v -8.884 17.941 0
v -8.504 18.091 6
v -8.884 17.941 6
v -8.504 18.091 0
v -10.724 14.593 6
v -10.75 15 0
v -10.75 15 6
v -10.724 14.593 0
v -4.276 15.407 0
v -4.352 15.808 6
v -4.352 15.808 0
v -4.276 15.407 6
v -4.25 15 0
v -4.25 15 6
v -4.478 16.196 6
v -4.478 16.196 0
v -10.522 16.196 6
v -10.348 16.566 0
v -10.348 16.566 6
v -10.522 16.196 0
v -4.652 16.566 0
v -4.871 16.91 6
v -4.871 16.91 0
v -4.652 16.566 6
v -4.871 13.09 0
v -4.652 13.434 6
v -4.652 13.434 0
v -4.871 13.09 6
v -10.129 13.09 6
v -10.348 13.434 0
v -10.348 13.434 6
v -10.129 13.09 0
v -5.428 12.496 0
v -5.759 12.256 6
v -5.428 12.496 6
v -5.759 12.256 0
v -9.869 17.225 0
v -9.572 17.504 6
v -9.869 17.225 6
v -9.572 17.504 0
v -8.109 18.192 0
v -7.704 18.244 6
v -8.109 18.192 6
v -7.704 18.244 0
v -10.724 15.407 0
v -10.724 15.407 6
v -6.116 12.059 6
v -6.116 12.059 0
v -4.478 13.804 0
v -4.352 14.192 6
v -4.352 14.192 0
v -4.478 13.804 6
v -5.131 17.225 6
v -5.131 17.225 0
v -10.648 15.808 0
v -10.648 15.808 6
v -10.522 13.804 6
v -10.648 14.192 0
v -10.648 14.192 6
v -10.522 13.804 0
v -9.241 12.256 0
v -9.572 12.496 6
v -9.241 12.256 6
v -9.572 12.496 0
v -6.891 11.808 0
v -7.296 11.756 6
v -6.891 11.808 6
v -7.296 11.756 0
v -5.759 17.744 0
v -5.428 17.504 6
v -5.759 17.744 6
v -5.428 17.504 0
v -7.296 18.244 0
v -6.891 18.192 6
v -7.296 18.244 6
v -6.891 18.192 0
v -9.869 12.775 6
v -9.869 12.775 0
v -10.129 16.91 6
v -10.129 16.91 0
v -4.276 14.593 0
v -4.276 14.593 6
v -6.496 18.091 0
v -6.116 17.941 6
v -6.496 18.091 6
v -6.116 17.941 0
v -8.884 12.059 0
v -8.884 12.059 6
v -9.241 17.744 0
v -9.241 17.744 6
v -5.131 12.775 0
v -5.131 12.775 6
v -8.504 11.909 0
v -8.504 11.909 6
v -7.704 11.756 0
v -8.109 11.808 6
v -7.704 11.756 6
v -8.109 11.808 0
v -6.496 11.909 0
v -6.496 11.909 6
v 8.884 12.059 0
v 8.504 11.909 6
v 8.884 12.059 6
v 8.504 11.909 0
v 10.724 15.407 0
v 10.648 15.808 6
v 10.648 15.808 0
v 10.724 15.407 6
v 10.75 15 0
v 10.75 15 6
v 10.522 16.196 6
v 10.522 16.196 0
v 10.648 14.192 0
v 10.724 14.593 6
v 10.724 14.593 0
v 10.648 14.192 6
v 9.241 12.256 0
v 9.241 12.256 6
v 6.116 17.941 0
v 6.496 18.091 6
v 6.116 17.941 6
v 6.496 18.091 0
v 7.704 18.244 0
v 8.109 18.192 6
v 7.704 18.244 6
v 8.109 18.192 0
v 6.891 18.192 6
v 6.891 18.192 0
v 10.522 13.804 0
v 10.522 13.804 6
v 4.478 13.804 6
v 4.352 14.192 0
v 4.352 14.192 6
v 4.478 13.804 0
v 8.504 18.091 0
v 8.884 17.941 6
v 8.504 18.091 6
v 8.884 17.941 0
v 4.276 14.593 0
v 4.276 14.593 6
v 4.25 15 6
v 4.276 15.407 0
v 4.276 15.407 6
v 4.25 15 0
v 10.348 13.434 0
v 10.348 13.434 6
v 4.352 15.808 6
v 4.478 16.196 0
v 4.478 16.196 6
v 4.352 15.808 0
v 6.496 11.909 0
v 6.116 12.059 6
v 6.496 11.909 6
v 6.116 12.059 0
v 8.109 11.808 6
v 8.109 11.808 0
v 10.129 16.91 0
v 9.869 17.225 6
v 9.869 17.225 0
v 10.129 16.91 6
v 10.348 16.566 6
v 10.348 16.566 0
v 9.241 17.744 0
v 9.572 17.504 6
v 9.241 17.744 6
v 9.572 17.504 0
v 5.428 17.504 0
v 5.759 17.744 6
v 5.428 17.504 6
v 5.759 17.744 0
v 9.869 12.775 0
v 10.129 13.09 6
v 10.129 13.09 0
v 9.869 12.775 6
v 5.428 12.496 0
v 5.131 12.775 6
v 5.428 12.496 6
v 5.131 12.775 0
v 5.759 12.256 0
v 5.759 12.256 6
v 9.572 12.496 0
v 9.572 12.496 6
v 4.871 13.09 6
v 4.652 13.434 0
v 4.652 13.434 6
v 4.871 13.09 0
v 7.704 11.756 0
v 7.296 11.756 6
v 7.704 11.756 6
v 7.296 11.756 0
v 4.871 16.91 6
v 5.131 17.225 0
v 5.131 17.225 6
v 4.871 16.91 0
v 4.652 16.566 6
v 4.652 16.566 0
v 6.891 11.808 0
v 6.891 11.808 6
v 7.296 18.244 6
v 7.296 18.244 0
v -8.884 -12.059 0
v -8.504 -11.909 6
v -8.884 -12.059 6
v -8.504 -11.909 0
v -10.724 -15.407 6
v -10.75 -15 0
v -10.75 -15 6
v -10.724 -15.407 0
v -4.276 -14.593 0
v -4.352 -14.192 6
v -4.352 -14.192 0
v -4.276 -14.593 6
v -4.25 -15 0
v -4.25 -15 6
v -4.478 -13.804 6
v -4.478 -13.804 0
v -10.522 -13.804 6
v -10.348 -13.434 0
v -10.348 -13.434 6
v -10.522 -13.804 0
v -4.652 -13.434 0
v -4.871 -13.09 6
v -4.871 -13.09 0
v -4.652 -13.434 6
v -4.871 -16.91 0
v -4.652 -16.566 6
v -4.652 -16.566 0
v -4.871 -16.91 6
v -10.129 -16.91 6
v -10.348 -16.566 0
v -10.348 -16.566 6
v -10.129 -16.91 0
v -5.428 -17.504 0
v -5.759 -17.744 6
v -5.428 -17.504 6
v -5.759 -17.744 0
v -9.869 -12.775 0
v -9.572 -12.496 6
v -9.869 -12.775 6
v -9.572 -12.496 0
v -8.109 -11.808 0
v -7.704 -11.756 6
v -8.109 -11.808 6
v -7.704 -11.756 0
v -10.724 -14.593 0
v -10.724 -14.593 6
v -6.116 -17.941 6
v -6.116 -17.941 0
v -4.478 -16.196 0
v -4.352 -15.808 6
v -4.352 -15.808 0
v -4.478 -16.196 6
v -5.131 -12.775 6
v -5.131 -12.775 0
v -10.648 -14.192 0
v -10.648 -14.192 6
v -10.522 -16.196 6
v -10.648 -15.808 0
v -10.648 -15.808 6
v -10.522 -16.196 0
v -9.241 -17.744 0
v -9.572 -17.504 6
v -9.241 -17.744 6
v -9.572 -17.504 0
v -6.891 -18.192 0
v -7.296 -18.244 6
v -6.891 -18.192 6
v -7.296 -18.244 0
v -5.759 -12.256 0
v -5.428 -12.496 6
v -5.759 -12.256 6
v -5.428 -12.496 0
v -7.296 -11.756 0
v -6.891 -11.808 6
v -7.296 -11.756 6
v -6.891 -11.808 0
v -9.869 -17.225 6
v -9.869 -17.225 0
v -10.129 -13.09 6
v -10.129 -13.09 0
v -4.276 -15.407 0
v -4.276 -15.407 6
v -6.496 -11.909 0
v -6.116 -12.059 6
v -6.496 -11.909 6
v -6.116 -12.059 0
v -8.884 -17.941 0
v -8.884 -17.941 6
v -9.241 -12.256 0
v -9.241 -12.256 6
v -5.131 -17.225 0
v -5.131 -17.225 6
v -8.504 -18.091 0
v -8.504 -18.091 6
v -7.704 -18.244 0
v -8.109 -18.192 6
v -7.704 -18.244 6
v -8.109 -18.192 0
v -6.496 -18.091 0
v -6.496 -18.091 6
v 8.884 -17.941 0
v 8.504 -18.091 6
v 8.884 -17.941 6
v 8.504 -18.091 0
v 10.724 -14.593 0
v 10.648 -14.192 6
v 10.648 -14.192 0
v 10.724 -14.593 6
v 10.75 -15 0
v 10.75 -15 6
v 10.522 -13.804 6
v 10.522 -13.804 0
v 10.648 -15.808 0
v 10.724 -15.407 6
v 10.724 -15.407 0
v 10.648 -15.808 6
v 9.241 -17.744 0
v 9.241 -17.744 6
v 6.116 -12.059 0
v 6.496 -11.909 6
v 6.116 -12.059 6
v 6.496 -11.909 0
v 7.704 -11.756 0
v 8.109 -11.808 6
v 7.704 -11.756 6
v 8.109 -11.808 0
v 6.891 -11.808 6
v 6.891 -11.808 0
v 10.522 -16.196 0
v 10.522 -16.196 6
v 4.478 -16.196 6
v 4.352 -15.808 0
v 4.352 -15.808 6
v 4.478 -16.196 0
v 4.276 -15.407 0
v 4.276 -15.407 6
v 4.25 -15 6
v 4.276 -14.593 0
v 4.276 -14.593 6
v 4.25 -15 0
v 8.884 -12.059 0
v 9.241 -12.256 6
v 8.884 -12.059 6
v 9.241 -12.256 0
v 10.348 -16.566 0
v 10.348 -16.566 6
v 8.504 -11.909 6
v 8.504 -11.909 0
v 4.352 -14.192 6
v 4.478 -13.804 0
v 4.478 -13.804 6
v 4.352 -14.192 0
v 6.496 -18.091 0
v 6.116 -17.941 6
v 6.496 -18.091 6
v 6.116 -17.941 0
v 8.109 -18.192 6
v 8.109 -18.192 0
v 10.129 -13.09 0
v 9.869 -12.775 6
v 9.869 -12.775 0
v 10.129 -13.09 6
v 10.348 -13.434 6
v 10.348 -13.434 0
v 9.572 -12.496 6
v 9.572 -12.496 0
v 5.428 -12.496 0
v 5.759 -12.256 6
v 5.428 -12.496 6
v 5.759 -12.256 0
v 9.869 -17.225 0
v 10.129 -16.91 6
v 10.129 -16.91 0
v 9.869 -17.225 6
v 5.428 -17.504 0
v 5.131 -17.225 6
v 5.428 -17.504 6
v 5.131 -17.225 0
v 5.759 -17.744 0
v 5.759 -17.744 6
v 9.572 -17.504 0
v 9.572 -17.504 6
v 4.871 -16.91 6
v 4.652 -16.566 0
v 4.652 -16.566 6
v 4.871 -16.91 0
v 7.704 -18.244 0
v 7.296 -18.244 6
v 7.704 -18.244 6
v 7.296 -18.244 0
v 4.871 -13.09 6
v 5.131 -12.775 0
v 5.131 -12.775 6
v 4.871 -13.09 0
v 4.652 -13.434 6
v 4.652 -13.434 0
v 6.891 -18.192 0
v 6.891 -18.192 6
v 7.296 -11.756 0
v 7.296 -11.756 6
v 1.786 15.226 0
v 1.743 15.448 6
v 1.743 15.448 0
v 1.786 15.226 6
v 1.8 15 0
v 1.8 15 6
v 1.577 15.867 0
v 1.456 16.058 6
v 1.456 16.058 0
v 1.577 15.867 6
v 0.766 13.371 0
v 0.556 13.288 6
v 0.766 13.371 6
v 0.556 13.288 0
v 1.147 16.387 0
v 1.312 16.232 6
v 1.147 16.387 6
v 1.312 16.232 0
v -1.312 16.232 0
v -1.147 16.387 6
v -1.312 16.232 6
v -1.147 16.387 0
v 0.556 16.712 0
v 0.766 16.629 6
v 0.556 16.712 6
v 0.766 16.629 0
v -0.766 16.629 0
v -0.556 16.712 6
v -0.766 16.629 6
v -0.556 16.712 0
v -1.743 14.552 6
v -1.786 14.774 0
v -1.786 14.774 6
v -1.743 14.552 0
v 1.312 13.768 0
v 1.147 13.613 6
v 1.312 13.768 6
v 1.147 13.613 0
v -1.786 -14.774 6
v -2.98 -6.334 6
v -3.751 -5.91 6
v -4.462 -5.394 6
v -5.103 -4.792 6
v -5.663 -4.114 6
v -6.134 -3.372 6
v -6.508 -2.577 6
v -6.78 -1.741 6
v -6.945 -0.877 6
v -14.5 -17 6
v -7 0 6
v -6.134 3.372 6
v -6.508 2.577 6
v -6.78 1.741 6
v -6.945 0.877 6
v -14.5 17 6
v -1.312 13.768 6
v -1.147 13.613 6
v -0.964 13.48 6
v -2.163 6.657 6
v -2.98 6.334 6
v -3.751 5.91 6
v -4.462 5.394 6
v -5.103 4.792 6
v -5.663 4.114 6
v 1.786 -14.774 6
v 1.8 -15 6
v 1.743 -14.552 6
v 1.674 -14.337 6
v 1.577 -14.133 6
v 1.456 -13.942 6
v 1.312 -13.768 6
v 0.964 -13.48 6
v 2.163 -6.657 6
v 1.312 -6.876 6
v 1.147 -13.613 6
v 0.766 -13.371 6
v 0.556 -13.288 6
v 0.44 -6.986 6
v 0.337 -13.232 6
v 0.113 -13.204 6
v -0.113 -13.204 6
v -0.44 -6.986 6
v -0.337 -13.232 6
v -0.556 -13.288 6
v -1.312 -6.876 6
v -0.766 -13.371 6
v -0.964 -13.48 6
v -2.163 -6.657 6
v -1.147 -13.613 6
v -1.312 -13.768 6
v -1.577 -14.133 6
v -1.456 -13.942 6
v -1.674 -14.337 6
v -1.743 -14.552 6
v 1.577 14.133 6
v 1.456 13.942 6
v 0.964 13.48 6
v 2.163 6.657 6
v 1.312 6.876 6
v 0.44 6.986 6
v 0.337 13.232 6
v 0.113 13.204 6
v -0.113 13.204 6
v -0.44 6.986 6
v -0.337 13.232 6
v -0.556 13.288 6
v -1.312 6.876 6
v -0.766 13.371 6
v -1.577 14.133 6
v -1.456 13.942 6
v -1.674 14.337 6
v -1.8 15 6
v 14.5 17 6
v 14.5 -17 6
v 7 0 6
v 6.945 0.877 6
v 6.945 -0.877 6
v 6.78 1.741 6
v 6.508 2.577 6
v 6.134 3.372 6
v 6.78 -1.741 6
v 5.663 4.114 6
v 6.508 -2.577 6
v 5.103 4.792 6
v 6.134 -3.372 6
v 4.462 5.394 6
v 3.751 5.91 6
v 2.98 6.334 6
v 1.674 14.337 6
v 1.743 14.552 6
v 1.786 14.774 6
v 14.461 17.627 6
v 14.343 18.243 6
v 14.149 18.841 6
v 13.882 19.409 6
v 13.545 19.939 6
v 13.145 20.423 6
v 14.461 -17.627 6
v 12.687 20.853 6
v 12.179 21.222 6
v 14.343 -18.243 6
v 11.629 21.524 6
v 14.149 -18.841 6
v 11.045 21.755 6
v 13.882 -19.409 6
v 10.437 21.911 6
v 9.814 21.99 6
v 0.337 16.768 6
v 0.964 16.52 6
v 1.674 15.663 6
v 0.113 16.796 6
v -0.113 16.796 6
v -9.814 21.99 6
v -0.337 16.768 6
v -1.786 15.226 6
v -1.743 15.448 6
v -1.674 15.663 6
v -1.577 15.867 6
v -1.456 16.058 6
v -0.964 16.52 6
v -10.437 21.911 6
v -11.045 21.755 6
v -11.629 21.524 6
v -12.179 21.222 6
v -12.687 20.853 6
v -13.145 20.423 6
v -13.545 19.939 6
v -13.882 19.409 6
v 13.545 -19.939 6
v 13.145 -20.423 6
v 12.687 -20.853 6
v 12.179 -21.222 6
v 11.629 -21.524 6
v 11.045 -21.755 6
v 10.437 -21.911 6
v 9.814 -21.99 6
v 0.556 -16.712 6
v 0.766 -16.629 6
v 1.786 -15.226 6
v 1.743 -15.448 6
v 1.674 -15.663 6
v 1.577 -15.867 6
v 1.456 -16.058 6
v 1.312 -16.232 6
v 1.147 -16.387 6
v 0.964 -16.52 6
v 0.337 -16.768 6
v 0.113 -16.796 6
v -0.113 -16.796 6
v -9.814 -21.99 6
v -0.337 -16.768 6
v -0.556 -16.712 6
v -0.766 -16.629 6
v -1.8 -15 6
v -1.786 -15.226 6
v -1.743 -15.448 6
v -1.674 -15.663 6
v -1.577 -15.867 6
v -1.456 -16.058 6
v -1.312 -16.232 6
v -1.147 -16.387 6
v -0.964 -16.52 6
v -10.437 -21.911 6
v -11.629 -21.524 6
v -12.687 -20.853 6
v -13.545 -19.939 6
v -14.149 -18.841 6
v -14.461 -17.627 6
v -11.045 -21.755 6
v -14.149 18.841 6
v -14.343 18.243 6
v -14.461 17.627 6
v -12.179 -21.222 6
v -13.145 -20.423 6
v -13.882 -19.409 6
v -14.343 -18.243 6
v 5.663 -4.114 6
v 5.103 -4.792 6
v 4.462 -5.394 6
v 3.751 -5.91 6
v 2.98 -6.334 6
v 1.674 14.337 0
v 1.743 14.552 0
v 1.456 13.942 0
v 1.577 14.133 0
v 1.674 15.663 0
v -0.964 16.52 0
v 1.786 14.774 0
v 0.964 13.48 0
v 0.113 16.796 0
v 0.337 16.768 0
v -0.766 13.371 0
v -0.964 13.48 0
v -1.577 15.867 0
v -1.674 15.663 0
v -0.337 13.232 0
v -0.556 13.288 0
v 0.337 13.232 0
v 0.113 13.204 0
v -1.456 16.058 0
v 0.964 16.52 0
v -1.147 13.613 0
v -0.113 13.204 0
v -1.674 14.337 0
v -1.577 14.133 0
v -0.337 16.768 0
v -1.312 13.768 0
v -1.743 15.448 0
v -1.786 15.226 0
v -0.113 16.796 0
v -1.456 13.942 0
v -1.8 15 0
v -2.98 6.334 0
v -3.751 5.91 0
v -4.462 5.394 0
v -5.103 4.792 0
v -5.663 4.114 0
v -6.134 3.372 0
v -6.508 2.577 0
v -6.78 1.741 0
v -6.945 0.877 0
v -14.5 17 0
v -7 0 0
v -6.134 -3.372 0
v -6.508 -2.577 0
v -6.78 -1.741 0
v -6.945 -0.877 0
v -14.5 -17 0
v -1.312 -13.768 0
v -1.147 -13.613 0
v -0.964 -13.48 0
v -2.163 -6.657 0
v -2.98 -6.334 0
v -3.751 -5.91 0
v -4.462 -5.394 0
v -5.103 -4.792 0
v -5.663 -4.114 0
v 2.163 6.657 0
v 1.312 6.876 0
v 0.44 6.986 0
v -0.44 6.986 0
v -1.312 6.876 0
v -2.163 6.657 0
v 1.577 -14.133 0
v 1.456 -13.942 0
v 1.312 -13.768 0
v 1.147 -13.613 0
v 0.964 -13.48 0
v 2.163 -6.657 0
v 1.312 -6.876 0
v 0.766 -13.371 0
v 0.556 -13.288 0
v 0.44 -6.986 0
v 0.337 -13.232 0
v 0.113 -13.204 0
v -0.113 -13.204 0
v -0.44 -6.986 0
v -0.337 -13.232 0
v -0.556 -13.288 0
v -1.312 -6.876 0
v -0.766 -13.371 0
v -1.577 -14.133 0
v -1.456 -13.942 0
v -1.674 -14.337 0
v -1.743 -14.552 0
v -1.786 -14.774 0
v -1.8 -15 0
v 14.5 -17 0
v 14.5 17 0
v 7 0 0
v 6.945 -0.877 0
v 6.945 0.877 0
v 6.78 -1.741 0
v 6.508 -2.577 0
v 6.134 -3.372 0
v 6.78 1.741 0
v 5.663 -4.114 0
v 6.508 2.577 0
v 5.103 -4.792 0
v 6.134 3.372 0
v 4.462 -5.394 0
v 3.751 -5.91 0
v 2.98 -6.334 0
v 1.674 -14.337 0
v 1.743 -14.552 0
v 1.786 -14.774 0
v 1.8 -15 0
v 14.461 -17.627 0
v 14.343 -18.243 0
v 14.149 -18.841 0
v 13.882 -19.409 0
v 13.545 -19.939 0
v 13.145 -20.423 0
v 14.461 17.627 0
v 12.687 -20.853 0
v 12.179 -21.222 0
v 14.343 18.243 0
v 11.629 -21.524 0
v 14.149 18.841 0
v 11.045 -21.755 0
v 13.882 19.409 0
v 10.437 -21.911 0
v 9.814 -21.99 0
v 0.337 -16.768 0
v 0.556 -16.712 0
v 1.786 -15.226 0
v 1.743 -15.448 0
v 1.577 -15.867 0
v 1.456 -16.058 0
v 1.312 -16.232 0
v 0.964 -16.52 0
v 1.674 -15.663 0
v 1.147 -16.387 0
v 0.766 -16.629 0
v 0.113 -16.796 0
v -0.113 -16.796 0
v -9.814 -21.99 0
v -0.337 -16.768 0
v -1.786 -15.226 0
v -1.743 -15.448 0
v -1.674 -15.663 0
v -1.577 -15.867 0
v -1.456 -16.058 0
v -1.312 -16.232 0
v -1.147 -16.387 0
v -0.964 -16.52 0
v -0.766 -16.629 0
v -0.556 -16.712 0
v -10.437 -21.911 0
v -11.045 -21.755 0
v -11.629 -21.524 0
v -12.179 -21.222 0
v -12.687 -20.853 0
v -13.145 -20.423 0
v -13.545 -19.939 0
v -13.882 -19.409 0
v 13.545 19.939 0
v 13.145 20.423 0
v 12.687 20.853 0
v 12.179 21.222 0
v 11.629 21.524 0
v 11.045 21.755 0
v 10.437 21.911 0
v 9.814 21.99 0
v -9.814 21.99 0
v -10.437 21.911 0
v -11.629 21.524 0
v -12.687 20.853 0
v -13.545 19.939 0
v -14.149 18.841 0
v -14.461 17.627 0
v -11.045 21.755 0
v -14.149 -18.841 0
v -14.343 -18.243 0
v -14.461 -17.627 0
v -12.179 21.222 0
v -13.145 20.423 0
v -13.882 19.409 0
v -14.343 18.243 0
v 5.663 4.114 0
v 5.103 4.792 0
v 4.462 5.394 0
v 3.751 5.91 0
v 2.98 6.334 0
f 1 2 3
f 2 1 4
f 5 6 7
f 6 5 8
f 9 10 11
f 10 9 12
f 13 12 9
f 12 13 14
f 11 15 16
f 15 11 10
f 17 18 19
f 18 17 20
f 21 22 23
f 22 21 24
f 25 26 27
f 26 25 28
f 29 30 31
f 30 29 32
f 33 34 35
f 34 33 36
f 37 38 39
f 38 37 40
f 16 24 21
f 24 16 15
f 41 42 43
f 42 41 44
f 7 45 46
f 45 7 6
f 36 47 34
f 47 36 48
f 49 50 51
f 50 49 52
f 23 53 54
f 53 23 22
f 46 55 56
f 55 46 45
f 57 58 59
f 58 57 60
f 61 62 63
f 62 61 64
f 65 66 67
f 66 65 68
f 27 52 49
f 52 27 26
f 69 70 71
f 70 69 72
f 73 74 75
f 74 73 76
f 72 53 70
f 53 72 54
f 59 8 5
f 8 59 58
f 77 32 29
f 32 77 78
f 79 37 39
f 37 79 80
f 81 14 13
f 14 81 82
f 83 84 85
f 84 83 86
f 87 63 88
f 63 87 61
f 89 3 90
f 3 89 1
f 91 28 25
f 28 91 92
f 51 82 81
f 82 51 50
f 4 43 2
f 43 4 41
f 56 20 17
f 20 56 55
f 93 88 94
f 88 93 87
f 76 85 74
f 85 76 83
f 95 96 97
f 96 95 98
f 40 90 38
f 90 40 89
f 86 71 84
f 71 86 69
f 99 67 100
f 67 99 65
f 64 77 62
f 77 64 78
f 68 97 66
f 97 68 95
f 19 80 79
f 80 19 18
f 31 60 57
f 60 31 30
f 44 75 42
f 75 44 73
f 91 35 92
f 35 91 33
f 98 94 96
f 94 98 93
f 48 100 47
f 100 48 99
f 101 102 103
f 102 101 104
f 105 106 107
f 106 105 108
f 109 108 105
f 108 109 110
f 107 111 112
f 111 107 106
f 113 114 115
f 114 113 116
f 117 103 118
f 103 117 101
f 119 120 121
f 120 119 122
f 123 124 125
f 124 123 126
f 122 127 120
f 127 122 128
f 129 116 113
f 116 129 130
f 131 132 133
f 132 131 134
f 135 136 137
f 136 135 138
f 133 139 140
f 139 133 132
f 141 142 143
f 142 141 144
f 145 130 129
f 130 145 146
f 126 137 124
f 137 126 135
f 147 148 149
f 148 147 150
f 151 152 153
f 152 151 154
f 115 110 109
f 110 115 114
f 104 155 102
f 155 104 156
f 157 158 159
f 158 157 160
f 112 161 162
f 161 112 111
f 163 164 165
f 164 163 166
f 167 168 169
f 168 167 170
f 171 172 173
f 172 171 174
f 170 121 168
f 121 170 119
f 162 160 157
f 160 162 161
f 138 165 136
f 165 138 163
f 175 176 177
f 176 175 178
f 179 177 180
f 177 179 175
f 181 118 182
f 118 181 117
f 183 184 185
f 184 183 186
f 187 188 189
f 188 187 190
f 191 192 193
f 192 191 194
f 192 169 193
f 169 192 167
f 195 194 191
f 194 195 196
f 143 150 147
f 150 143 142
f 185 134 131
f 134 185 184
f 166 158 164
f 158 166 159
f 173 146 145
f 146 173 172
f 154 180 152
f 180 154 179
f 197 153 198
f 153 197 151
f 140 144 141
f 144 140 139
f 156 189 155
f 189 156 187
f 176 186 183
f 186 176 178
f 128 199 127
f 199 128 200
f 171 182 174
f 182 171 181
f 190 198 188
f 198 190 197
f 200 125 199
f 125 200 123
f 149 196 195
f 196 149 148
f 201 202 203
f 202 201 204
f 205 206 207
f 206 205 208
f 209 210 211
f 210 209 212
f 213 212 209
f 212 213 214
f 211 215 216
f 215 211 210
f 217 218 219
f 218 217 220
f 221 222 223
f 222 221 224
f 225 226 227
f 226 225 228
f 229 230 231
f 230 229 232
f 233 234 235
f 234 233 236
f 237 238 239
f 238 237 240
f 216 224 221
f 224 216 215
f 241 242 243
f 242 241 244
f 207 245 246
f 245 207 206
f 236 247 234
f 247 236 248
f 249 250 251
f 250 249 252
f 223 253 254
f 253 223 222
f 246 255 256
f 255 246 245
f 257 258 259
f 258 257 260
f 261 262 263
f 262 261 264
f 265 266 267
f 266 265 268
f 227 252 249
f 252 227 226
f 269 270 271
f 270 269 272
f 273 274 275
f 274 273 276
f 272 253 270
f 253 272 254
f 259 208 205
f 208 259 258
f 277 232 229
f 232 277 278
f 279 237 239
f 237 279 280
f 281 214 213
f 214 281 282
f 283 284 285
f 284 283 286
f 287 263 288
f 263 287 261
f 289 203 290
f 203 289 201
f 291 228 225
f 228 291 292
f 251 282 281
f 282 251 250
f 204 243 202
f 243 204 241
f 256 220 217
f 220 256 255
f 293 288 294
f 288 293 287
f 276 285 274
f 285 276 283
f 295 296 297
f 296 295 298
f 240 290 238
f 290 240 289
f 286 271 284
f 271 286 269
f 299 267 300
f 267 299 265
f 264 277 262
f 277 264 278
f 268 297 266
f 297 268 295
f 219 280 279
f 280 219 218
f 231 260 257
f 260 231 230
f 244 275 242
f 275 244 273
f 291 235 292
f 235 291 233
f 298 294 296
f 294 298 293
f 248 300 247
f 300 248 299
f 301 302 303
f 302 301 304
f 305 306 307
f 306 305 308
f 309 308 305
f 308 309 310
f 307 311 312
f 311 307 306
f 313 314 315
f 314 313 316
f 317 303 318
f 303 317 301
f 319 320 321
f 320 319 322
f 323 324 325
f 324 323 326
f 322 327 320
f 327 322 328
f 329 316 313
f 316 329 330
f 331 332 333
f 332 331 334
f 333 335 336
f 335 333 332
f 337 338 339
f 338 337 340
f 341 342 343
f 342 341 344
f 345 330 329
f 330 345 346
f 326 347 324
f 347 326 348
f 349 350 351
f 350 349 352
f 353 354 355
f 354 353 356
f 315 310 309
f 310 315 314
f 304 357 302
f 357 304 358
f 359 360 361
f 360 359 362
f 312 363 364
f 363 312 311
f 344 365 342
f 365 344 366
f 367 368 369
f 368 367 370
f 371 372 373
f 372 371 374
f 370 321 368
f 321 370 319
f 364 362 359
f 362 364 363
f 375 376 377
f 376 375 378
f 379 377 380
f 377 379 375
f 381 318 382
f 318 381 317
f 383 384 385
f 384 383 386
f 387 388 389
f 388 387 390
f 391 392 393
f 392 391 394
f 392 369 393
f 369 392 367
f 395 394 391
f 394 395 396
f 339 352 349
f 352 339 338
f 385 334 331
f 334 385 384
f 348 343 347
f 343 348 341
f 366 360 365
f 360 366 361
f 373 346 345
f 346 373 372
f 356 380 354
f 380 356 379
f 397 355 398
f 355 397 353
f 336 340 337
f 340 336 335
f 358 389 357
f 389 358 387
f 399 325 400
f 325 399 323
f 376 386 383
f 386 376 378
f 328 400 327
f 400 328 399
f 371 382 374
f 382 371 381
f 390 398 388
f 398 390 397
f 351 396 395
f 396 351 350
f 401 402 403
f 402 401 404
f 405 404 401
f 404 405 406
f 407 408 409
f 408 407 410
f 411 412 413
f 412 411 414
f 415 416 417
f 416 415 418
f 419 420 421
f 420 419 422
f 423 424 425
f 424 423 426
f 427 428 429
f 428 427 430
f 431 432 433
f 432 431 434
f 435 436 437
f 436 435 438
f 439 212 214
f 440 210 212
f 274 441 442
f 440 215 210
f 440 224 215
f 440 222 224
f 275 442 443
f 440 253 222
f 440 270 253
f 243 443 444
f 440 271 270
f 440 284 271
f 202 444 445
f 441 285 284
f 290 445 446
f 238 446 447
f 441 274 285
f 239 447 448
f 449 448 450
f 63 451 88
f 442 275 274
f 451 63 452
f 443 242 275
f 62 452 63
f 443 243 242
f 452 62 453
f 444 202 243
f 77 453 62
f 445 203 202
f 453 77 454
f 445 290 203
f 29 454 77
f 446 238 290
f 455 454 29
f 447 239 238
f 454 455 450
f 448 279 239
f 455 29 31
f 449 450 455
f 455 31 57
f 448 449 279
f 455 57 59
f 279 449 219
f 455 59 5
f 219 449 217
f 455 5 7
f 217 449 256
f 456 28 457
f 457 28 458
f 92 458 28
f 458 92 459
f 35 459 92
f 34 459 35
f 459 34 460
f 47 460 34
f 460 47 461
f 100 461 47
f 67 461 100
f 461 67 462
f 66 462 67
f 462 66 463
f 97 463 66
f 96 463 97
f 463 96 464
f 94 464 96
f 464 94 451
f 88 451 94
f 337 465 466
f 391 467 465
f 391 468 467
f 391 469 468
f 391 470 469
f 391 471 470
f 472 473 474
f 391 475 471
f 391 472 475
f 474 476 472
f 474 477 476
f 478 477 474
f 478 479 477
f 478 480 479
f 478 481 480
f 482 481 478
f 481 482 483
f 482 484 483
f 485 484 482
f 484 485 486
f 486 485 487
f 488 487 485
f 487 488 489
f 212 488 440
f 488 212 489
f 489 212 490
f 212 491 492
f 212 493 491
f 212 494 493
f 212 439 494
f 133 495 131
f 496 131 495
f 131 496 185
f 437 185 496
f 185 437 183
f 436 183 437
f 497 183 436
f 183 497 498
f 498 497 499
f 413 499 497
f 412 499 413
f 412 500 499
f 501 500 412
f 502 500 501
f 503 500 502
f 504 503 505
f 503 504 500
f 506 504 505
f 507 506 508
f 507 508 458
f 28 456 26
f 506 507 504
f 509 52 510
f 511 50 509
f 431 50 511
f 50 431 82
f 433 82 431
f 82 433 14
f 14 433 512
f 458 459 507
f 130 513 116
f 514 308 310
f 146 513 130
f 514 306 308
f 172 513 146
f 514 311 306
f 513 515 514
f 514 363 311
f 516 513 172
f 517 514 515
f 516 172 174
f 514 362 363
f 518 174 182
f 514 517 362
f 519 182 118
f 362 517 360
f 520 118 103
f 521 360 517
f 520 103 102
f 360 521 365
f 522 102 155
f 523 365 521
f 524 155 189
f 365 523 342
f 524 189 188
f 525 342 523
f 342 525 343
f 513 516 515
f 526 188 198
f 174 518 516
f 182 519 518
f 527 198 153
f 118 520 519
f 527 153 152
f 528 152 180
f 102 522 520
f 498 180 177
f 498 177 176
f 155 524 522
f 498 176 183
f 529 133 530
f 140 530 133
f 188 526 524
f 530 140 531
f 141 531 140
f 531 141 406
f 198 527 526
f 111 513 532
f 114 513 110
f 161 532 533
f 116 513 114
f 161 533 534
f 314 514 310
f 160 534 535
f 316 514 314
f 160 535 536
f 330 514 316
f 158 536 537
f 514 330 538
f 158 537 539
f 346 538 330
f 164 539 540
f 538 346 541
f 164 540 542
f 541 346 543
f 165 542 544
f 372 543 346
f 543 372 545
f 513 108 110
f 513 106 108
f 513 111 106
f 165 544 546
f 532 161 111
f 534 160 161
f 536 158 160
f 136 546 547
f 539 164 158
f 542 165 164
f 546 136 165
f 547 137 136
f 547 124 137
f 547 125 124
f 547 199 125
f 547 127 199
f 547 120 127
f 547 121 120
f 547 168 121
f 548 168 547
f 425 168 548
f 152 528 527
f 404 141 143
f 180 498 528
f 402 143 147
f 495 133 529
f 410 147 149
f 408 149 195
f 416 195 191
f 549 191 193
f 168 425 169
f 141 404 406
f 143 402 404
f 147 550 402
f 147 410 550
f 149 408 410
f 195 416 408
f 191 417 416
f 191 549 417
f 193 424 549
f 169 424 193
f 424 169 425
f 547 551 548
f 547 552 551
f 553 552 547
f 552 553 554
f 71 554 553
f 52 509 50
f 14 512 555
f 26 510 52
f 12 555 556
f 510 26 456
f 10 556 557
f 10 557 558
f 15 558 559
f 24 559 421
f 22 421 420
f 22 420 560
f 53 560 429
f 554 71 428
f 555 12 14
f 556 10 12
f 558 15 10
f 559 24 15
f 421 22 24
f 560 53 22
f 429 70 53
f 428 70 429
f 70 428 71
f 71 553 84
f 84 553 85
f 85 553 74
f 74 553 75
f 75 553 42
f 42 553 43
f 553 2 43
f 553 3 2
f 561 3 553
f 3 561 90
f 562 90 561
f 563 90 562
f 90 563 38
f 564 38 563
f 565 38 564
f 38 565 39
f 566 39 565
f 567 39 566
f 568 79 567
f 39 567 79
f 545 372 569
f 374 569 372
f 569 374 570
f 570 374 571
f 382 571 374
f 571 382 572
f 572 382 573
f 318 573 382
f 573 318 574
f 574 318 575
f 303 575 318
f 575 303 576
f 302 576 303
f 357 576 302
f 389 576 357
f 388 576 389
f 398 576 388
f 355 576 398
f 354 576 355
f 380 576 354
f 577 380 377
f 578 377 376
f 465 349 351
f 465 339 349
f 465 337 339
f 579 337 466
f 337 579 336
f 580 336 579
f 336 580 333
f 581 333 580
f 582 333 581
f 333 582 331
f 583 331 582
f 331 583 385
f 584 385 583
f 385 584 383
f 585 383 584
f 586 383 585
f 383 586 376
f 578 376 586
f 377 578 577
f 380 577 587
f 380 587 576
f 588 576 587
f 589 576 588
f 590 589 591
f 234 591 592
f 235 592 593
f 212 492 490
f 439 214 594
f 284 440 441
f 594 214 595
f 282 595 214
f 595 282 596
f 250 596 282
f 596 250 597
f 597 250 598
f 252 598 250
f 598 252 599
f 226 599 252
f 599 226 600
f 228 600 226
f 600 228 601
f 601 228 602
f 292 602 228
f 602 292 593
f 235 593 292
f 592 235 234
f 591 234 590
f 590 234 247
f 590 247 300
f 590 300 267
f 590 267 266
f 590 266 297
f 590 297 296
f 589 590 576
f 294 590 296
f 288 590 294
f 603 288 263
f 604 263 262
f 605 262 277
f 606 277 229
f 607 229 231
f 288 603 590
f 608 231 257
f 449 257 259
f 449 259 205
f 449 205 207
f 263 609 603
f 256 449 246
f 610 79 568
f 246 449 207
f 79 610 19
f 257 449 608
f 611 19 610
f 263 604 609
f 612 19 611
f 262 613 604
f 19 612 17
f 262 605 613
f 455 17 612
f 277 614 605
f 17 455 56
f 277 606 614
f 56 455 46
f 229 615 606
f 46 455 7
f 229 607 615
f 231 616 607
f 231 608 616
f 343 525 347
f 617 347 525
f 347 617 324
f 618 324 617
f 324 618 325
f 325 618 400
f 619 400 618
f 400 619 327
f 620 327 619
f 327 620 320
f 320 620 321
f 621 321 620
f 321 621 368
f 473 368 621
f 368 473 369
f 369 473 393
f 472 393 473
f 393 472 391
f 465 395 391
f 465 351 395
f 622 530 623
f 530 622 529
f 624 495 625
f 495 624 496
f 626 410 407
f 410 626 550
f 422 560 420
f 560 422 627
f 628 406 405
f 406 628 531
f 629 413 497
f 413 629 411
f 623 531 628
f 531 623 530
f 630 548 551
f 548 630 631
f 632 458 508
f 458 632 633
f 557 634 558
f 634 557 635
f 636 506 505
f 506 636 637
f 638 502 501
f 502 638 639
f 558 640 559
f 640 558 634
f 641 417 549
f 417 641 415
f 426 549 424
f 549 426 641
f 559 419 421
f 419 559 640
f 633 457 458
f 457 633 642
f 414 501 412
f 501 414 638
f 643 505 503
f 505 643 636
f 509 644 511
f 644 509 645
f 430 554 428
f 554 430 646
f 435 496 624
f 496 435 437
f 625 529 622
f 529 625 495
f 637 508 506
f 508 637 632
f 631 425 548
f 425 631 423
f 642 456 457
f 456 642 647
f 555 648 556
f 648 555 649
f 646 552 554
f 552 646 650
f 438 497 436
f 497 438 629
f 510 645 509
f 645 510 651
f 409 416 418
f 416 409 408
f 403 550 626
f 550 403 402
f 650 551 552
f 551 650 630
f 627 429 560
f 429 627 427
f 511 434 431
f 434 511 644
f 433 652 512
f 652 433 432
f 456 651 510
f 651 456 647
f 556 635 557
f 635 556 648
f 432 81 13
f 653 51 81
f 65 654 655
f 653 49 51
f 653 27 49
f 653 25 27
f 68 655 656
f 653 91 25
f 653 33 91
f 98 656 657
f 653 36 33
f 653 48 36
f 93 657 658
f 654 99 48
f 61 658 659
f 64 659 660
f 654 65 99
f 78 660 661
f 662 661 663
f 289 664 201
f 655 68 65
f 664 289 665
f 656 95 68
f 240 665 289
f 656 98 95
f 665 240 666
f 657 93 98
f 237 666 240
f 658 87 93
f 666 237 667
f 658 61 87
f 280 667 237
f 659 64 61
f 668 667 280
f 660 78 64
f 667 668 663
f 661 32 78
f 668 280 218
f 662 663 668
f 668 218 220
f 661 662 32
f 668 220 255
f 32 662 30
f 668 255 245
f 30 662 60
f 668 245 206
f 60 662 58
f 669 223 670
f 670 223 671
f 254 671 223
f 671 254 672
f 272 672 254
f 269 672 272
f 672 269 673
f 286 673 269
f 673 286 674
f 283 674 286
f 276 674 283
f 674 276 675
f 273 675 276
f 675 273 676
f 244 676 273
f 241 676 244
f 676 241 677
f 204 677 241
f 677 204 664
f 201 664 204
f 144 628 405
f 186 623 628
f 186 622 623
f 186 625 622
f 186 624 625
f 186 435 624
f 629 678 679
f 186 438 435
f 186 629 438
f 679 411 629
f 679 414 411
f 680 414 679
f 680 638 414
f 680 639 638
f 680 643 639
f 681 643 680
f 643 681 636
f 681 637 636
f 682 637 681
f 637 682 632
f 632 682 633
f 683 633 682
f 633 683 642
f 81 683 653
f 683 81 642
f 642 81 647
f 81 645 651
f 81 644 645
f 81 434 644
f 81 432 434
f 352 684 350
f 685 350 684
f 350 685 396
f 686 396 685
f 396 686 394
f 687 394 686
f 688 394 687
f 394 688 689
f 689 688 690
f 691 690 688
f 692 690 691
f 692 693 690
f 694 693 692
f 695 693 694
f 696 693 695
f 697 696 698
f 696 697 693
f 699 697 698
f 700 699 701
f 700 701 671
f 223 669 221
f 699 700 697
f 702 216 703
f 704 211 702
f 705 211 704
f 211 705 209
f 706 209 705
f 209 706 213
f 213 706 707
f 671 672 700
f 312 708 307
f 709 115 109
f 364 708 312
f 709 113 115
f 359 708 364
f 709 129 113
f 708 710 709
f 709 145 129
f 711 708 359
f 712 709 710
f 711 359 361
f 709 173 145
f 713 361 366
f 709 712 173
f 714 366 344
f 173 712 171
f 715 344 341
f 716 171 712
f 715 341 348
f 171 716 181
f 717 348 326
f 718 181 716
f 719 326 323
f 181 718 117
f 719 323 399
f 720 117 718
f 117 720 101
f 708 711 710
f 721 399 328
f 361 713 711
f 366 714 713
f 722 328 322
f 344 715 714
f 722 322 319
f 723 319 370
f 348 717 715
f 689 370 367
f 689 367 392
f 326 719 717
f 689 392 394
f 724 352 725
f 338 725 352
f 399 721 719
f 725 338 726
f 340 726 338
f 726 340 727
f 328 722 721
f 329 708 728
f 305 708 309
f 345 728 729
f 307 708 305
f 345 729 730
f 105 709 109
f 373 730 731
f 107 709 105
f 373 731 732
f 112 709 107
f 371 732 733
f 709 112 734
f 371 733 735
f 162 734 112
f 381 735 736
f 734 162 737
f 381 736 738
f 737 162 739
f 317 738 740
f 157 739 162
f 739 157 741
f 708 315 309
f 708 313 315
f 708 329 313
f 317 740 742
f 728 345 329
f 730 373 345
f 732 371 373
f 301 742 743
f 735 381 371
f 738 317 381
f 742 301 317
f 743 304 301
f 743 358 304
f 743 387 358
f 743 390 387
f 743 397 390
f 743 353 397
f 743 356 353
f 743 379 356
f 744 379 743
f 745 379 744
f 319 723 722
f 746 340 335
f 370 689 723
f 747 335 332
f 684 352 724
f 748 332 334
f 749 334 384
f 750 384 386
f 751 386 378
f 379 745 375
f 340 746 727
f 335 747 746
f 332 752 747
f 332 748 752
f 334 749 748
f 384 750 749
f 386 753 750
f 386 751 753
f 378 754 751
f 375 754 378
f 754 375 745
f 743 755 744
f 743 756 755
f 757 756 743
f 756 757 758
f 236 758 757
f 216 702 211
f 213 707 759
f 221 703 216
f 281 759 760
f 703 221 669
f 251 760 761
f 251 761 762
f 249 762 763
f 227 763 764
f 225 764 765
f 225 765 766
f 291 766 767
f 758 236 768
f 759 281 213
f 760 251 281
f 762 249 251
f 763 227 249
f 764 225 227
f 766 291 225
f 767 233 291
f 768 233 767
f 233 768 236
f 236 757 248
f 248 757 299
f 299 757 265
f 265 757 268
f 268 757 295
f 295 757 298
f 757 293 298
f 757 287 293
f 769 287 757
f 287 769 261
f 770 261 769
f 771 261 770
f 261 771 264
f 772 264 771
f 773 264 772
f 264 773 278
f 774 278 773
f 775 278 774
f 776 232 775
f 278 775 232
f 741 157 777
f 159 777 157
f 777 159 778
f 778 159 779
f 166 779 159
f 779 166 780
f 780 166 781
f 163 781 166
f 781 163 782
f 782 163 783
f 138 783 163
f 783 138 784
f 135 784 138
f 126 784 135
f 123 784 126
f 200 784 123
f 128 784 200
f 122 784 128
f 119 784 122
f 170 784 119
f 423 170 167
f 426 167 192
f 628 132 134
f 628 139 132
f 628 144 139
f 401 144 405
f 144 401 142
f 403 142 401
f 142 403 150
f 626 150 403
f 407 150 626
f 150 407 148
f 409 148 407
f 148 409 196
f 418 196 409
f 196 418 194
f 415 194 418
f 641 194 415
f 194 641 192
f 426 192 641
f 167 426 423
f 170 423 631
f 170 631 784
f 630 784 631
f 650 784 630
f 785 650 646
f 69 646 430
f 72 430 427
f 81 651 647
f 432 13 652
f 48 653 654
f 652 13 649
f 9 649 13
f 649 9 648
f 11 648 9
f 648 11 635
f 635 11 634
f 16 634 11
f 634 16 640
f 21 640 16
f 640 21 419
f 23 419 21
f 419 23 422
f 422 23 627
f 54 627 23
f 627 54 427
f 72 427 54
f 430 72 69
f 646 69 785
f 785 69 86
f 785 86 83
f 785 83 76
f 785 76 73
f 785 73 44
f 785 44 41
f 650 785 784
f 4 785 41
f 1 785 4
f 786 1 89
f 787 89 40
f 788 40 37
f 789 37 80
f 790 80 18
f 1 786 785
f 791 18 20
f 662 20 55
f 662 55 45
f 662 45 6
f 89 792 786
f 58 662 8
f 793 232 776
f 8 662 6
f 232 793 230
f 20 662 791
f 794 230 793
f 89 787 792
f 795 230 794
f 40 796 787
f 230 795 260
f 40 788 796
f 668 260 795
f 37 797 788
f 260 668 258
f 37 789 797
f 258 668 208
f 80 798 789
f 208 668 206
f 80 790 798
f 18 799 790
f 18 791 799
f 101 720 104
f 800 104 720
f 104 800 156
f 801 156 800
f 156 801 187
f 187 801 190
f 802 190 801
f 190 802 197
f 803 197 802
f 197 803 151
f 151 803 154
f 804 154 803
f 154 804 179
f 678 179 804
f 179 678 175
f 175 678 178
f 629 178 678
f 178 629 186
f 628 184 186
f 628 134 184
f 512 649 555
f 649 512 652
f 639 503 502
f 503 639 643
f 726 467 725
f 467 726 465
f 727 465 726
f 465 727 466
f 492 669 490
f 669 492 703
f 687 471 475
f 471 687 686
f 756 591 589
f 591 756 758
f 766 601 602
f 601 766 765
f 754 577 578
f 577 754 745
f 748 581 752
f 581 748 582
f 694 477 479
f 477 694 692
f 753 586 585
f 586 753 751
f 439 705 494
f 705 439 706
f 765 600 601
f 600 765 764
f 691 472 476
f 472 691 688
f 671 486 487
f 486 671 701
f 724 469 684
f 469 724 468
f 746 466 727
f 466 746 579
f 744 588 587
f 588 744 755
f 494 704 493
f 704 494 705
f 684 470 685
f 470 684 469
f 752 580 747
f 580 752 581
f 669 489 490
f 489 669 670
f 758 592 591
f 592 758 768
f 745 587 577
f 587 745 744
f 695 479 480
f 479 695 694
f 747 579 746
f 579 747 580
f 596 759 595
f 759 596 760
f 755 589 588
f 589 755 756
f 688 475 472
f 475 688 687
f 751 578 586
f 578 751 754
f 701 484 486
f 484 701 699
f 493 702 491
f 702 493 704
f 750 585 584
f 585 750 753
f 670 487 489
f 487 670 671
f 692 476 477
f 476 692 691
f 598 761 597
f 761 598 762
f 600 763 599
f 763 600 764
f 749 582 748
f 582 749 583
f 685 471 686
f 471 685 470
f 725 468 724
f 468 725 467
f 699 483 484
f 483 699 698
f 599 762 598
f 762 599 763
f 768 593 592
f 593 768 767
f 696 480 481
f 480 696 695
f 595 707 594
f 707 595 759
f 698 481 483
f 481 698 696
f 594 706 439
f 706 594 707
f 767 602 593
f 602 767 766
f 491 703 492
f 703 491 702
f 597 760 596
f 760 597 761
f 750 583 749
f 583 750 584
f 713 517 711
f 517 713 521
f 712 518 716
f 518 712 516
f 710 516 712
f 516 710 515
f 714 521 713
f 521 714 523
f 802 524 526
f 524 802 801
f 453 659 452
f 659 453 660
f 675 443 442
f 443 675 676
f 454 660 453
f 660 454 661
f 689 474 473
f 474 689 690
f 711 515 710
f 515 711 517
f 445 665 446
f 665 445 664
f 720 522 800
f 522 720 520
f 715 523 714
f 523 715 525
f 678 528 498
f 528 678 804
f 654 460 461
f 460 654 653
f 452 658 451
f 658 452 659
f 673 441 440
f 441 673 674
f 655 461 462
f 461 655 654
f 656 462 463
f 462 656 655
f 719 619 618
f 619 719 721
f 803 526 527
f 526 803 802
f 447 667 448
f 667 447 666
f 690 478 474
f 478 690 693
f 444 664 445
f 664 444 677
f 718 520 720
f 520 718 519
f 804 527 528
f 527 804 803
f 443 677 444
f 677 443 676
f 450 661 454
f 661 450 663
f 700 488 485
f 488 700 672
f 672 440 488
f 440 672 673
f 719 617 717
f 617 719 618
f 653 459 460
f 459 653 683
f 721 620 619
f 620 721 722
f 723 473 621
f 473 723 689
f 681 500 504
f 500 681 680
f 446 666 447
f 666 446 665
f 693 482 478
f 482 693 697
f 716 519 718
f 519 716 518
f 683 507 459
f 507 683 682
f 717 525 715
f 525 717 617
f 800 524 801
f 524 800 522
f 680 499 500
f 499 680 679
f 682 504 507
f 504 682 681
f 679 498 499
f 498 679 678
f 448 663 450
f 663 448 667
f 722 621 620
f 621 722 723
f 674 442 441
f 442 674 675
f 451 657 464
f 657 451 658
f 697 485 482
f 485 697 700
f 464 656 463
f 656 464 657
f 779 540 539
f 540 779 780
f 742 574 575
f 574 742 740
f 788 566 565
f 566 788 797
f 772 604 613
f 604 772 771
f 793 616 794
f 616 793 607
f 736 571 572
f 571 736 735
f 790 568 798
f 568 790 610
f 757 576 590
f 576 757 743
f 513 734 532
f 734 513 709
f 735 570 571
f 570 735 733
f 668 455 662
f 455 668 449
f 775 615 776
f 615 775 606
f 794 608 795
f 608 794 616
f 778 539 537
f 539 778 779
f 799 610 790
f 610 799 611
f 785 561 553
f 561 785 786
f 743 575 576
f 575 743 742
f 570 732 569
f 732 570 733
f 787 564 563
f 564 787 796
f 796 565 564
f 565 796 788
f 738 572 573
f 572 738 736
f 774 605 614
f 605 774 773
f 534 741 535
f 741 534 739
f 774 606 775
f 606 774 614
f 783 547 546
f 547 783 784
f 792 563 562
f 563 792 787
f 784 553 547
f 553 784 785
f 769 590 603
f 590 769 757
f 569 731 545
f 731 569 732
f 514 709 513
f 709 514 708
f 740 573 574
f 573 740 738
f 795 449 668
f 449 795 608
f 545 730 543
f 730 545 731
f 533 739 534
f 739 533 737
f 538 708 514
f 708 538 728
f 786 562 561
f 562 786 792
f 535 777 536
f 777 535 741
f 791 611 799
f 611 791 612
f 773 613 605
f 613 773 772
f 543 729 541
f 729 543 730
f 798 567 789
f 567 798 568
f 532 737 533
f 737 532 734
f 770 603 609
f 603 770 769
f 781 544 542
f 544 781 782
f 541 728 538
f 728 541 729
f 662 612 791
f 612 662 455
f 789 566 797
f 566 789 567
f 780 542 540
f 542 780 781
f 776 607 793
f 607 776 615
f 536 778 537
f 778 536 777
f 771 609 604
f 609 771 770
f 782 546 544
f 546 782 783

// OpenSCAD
$fn = 50;


difference() {
	union() {
		hull() {
			translate(v = [-9.5000000000, 17.0000000000, 0]) {
				cylinder(h = 6, r = 5);
			}
			translate(v = [9.5000000000, 17.0000000000, 0]) {
				cylinder(h = 6, r = 5);
			}
			translate(v = [-9.5000000000, -17.0000000000, 0]) {
				cylinder(h = 6, r = 5);
			}
			translate(v = [9.5000000000, -17.0000000000, 0]) {
				cylinder(h = 6, r = 5);
			}
		}
	}
	union() {
		#translate(v = [-7.5000000000, 15.0000000000, 0]) {
			cylinder(h = 6, r = 3.2500000000);
		}
		#translate(v = [7.5000000000, 15.0000000000, 0]) {
			cylinder(h = 6, r = 3.2500000000);
		}
		#translate(v = [-7.5000000000, -15.0000000000, 0]) {
			cylinder(h = 6, r = 3.2500000000);
		}
		#translate(v = [7.5000000000, -15.0000000000, 0]) {
			cylinder(h = 6, r = 3.2500000000);
		}
		#translate(v = [-7.5000000000, -15.0000000000, -100.0000000000]) {
			cylinder(h = 200, r = 3.2500000000);
		}
		#translate(v = [-7.5000000000, 15.0000000000, -100.0000000000]) {
			cylinder(h = 200, r = 3.2500000000);
		}
		#translate(v = [7.5000000000, -15.0000000000, -100.0000000000]) {
			cylinder(h = 200, r = 3.2500000000);
		}
		#translate(v = [7.5000000000, 15.0000000000, -100.0000000000]) {
			cylinder(h = 200, r = 3.2500000000);
		}
		#translate(v = [-7.5000000000, 15.0000000000, 0]) {
			cylinder(h = 6, r = 1.8000000000);
		}
		#translate(v = [0.0000000000, 15.0000000000, 0]) {
			cylinder(h = 6, r = 1.8000000000);
		}
		#translate(v = [7.5000000000, 15.0000000000, 0]) {
			cylinder(h = 6, r = 1.8000000000);
		}
		#translate(v = [-7.5000000000, -15.0000000000, 0]) {
			cylinder(h = 6, r = 1.8000000000);
		}
		#translate(v = [0.0000000000, -15.0000000000, 0]) {
			cylinder(h = 6, r = 1.8000000000);
		}
		#translate(v = [7.5000000000, -15.0000000000, 0]) {
			cylinder(h = 6, r = 1.8000000000);
		}
		#translate(v = [-7.5000000000, 15.0000000000, 0]) {
			cylinder(h = 6, r = 1.8000000000);
		}
		#translate(v = [0.0000000000, 15.0000000000, 0]) {
			cylinder(h = 6, r = 1.8000000000);
		}
		#translate(v = [7.5000000000, 15.0000000000, 0]) {
			cylinder(h = 6, r = 1.8000000000);
		}
		#translate(v = [-7.5000000000, -15.0000000000, 0]) {
			cylinder(h = 6, r = 1.8000000000);
		}
		#translate(v = [0.0000000000, -15.0000000000, 0]) {
			cylinder(h = 6, r = 1.8000000000);
		}
		#translate(v = [7.5000000000, -15.0000000000, 0]) {
			cylinder(h = 6, r = 1.8000000000);
		}
		#translate(v = [-7.5000000000, 15.0000000000, 0]) {
			cylinder(h = 6, r = 1.8000000000);
		}
		#translate(v = [0.0000000000, 15.0000000000, 0]) {
			cylinder(h = 6, r = 1.8000000000);
		}
		#translate(v = [7.5000000000, 15.0000000000, 0]) {
			cylinder(h = 6, r = 1.8000000000);
		}
		#translate(v = [-7.5000000000, -15.0000000000, 0]) {
			cylinder(h = 6, r = 1.8000000000);
		}
		#translate(v = [0.0000000000, -15.0000000000, 0]) {
			cylinder(h = 6, r = 1.8000000000);
		}
		#translate(v = [7.5000000000, -15.0000000000, 0]) {
			cylinder(h = 6, r = 1.8000000000);
		}
		#cylinder(h = 6, r = 7.0000000000);
	}
}
